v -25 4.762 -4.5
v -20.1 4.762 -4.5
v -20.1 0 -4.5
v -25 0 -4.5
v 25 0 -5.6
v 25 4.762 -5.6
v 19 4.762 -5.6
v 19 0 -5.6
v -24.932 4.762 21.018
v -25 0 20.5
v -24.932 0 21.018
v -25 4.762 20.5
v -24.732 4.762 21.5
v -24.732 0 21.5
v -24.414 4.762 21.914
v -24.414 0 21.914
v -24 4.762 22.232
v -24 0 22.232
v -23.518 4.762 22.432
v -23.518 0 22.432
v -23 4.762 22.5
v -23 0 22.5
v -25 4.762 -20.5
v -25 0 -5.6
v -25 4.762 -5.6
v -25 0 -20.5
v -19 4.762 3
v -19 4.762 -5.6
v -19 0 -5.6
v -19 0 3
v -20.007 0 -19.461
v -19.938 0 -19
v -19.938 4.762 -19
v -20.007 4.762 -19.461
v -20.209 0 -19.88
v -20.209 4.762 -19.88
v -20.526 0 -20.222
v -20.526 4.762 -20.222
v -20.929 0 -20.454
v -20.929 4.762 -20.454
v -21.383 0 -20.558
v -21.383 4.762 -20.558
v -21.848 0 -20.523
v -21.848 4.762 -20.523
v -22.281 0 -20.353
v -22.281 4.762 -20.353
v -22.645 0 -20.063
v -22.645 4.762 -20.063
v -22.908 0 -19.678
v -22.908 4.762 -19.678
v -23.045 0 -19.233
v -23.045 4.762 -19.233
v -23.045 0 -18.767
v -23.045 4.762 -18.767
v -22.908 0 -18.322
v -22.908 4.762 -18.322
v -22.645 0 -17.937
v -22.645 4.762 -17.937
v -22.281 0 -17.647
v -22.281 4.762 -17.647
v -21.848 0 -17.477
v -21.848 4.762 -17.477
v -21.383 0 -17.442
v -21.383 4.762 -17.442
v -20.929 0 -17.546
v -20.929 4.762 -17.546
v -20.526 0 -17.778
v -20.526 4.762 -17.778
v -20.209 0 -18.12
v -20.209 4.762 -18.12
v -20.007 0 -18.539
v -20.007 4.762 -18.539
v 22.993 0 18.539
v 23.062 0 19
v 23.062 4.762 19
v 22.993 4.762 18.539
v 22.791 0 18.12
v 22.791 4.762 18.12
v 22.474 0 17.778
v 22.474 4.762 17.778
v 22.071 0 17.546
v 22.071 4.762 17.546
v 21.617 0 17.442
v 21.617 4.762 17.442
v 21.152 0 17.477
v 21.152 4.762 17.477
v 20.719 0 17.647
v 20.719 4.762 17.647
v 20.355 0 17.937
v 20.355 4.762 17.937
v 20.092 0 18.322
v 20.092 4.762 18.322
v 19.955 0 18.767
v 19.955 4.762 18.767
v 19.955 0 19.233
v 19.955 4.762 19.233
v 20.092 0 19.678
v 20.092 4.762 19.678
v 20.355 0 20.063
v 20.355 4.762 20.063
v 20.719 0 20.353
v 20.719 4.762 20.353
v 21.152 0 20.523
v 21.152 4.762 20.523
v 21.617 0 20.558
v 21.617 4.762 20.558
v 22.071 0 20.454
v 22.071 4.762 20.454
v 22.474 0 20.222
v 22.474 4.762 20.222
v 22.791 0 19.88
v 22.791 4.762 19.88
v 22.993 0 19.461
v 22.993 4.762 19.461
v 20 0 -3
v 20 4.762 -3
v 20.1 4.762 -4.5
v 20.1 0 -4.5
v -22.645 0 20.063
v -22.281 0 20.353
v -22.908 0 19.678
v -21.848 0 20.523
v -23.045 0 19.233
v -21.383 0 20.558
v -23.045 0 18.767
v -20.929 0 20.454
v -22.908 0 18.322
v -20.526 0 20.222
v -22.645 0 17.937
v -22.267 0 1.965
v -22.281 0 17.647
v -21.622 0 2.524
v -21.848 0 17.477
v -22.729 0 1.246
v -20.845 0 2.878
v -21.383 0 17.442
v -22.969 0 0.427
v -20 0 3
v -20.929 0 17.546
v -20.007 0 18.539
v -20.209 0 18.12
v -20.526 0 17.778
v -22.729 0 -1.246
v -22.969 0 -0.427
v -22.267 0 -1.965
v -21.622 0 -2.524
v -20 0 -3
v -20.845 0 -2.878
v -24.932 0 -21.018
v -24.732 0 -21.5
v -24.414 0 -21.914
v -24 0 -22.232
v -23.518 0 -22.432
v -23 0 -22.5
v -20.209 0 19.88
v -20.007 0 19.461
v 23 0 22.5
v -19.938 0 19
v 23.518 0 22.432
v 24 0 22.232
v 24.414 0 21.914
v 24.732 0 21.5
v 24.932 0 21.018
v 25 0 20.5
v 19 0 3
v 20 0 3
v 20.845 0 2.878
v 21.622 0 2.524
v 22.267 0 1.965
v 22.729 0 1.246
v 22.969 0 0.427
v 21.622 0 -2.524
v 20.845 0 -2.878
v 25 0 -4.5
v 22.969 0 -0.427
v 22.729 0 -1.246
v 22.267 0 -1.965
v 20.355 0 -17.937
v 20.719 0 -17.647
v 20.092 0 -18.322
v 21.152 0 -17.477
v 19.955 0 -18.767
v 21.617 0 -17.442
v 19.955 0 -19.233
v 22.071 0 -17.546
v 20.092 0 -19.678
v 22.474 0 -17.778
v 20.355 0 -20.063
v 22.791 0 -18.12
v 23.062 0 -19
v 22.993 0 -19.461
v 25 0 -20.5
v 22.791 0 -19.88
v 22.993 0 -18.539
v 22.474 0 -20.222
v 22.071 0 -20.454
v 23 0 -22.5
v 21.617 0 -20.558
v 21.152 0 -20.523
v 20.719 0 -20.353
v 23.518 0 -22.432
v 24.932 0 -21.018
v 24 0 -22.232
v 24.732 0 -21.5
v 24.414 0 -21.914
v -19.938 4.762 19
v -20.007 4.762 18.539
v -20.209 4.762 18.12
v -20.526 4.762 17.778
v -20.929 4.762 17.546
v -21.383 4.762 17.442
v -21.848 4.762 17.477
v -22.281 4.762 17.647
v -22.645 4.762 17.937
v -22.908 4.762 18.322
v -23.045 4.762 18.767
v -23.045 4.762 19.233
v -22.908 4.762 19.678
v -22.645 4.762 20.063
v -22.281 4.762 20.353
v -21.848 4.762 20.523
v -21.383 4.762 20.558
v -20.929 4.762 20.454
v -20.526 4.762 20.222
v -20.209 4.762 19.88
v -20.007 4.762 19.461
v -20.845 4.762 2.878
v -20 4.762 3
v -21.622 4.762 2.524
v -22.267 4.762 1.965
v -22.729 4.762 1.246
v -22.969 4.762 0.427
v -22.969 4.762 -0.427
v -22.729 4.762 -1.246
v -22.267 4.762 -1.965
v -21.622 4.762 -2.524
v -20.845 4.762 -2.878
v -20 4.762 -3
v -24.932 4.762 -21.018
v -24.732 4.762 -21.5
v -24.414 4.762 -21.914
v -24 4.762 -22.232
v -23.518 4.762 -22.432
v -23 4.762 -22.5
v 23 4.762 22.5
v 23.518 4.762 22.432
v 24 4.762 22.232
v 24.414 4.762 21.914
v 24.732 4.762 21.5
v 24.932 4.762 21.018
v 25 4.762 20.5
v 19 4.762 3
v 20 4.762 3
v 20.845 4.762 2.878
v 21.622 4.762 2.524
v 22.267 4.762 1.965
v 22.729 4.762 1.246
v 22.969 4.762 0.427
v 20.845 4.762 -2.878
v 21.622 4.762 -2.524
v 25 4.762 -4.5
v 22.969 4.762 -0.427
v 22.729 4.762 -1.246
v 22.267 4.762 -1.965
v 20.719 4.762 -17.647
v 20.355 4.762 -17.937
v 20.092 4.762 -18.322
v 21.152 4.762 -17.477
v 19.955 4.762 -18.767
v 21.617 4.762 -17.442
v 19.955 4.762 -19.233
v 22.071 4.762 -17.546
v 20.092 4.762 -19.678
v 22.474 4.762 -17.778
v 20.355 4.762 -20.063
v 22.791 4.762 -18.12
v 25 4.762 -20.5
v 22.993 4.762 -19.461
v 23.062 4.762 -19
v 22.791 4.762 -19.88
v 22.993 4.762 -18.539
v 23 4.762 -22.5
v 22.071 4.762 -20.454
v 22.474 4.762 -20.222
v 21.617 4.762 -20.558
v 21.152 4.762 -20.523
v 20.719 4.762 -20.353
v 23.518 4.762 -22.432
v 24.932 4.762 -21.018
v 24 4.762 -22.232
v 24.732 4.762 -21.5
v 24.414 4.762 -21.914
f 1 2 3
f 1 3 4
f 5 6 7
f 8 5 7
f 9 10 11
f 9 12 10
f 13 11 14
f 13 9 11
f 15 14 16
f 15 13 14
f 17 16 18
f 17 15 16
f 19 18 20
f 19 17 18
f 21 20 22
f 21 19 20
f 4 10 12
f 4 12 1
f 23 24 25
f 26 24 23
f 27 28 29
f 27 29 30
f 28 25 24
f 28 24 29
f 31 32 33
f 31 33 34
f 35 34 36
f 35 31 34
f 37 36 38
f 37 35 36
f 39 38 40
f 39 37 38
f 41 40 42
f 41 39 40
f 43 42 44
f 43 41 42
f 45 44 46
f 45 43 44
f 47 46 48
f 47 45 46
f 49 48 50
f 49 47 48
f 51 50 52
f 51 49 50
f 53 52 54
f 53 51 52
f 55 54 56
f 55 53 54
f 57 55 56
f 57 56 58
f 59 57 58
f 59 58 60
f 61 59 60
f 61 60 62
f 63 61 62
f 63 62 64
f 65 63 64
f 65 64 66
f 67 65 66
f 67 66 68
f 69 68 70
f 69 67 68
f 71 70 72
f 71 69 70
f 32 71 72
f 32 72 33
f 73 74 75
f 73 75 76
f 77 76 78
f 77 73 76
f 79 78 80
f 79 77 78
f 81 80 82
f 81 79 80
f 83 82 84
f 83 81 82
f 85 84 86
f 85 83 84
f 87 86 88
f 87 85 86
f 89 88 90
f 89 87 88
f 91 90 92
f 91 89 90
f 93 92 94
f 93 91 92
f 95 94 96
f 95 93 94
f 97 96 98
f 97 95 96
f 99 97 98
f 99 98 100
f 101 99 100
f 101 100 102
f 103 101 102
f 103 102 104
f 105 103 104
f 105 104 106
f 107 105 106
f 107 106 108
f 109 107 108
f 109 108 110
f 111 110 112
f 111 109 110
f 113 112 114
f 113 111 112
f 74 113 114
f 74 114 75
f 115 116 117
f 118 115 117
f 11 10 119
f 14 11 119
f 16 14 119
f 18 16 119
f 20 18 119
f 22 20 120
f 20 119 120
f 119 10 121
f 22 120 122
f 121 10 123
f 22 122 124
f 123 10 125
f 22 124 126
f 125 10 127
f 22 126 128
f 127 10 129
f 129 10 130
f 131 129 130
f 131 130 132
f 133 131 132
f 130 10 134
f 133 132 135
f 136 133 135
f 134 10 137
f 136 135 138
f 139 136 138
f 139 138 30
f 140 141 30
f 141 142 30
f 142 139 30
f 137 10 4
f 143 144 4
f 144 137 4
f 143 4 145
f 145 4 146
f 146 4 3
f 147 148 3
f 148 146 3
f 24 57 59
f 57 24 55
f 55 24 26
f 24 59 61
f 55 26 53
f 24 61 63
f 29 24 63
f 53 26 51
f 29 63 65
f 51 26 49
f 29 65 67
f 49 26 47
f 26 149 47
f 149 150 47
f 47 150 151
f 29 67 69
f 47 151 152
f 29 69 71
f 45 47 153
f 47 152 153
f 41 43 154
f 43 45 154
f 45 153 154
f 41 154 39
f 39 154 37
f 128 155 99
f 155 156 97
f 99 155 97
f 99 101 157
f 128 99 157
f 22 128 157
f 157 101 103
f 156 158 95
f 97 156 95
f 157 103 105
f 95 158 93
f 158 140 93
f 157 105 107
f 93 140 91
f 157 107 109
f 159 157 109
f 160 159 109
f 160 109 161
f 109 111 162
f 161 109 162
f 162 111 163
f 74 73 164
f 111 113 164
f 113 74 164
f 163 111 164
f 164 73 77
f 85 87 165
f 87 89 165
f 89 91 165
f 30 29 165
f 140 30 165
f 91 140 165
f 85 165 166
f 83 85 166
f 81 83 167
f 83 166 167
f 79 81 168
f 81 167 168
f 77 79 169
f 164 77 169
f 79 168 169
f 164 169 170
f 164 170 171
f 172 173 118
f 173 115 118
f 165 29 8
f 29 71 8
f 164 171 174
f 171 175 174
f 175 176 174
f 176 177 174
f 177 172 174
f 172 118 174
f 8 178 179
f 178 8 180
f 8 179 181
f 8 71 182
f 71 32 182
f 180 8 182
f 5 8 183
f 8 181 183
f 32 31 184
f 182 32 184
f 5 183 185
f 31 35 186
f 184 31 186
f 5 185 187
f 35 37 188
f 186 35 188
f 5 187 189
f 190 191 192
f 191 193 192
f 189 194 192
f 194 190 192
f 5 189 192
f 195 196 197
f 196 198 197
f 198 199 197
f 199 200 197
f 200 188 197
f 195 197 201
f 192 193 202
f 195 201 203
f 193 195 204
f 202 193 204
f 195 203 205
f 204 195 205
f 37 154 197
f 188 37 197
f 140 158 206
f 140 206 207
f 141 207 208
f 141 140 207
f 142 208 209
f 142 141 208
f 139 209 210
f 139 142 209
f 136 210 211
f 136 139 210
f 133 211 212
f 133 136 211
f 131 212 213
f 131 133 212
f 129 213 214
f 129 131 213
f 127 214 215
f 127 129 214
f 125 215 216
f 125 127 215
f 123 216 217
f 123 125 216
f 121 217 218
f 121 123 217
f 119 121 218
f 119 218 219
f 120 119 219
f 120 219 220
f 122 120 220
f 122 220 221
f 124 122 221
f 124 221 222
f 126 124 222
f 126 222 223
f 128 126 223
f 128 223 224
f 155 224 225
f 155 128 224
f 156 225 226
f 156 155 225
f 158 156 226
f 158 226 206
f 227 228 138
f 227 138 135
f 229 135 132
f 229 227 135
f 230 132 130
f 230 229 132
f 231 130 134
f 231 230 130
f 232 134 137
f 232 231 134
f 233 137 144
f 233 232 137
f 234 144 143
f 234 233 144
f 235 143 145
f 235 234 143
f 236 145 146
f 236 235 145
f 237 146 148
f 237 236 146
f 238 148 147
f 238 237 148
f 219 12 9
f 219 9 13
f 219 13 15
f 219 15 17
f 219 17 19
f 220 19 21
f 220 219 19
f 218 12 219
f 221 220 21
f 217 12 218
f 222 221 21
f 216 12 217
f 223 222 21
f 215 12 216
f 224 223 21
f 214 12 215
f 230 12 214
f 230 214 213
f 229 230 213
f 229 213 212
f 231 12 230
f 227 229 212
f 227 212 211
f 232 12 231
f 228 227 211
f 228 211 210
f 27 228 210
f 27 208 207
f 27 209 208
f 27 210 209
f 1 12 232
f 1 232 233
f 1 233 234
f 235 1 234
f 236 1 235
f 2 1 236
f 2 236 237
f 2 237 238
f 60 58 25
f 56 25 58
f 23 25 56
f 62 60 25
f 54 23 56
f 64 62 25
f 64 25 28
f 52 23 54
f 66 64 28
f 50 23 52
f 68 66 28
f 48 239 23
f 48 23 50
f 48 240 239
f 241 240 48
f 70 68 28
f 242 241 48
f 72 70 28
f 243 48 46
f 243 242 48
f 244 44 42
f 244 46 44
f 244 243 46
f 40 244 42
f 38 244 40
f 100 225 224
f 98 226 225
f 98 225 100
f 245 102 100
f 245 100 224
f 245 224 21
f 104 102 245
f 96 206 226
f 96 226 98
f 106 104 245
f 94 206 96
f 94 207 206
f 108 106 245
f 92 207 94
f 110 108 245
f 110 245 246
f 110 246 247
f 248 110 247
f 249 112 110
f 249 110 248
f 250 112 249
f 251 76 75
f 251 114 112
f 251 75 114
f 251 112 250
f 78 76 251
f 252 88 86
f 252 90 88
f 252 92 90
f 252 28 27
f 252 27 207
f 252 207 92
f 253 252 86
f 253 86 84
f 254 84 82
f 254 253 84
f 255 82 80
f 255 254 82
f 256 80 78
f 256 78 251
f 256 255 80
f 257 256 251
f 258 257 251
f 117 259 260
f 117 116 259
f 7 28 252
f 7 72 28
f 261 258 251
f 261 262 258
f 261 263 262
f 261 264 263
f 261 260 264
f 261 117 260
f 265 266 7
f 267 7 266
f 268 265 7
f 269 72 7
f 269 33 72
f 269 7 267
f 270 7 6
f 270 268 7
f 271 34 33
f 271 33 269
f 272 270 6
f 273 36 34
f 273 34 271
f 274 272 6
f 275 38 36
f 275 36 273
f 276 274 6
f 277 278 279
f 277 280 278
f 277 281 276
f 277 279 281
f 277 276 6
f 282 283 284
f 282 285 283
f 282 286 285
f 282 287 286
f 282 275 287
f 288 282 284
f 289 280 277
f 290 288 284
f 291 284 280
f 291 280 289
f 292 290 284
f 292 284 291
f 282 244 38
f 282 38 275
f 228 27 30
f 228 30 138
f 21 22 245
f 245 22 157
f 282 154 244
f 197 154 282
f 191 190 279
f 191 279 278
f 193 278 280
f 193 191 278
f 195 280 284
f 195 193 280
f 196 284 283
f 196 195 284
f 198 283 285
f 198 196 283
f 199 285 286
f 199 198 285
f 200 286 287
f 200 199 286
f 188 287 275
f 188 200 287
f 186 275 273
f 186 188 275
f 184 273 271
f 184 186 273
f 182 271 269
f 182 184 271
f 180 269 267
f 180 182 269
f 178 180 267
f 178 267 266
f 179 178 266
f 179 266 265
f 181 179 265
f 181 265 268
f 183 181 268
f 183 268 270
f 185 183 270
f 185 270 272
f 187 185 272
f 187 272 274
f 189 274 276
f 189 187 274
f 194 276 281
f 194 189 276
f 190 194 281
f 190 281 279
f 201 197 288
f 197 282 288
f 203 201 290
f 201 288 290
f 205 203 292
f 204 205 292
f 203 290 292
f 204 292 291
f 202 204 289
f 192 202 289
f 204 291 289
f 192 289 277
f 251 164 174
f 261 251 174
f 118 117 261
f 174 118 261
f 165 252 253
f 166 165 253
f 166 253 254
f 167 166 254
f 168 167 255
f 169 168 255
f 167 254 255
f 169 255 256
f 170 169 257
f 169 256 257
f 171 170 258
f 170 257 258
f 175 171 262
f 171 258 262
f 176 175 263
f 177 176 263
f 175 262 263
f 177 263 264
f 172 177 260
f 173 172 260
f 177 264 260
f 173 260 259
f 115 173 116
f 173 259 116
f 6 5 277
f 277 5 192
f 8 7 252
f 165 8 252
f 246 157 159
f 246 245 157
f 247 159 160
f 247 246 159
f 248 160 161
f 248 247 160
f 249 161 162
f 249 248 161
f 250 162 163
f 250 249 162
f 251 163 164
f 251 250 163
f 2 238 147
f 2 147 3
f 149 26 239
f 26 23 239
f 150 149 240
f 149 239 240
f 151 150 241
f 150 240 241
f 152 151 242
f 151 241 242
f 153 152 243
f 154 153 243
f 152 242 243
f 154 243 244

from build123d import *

# Parameters (mm, degrees)
SKETCH1_W           = 50
SKETCH1_H           = 45
SKETCH1_R           = 1.5625
BOSS_EXTRUDE1_DEPTH = 4.7625
FILLET1_R           = 2
CUT_EXTRUDE1_DEPTH  = 5.7625


with BuildPart() as part:
    # Sketch1 → Boss-Extrude1 (new body)
    with BuildSketch(Plane(origin=(0, 0, 0), x_dir=(1, 0, 0), z_dir=(0, 1, 0))):
        Rectangle(SKETCH1_W, SKETCH1_H)
        with Locations((-21.5, 19)):
            Circle(SKETCH1_R, mode=Mode.SUBTRACT)
        with Locations((21.5, 19)):
            Circle(SKETCH1_R, mode=Mode.SUBTRACT)
        with Locations((21.5, -19)):
            Circle(SKETCH1_R, mode=Mode.SUBTRACT)
        with Locations((-21.5, -19)):
            Circle(SKETCH1_R, mode=Mode.SUBTRACT)
    extrude(amount=BOSS_EXTRUDE1_DEPTH)

    # Fillet1
    fillet1_edges = [part.edges().sort_by_distance(p)[0] for p in [
        (-25, 2.38125, -22.5),
        (25, 2.38125, -22.5),
        (25, 2.38125, 22.5),
        (-25, 2.38125, 22.5),
    ]]
    fillet(fillet1_edges, radius=FILLET1_R)

    # Sketch2 → Cut-Extrude1 (cut, through all)
    with BuildSketch(Plane(origin=(0, 4.7625, 0), x_dir=(1, 0, 0), z_dir=(0, 1, 0))):
        with BuildLine():
            Line((-25, 5.6), (-19, 5.6))
            Line((-19, 5.6), (-19, -3))
            Line((-19, -3), (-20, -3))
            ThreePointArc((-20, -3), (-23, 0), (-20, 3))
            Line((-20, 3), (-20.1, 4.5))
            Line((-20.1, 4.5), (-25, 4.5))
            Line((-25, 4.5), (-25, 5.6))
        make_face()
    cut_extrude1 = extrude(amount=-CUT_EXTRUDE1_DEPTH, mode=Mode.SUBTRACT)

    # Mirror1: Cut-Extrude1 across plane
    add(cut_extrude1.mirror(Plane(origin=(0, 0, 0), x_dir=(0, 0, 1), z_dir=(1, 0, 0))), mode=Mode.SUBTRACT)


solid = part.part
